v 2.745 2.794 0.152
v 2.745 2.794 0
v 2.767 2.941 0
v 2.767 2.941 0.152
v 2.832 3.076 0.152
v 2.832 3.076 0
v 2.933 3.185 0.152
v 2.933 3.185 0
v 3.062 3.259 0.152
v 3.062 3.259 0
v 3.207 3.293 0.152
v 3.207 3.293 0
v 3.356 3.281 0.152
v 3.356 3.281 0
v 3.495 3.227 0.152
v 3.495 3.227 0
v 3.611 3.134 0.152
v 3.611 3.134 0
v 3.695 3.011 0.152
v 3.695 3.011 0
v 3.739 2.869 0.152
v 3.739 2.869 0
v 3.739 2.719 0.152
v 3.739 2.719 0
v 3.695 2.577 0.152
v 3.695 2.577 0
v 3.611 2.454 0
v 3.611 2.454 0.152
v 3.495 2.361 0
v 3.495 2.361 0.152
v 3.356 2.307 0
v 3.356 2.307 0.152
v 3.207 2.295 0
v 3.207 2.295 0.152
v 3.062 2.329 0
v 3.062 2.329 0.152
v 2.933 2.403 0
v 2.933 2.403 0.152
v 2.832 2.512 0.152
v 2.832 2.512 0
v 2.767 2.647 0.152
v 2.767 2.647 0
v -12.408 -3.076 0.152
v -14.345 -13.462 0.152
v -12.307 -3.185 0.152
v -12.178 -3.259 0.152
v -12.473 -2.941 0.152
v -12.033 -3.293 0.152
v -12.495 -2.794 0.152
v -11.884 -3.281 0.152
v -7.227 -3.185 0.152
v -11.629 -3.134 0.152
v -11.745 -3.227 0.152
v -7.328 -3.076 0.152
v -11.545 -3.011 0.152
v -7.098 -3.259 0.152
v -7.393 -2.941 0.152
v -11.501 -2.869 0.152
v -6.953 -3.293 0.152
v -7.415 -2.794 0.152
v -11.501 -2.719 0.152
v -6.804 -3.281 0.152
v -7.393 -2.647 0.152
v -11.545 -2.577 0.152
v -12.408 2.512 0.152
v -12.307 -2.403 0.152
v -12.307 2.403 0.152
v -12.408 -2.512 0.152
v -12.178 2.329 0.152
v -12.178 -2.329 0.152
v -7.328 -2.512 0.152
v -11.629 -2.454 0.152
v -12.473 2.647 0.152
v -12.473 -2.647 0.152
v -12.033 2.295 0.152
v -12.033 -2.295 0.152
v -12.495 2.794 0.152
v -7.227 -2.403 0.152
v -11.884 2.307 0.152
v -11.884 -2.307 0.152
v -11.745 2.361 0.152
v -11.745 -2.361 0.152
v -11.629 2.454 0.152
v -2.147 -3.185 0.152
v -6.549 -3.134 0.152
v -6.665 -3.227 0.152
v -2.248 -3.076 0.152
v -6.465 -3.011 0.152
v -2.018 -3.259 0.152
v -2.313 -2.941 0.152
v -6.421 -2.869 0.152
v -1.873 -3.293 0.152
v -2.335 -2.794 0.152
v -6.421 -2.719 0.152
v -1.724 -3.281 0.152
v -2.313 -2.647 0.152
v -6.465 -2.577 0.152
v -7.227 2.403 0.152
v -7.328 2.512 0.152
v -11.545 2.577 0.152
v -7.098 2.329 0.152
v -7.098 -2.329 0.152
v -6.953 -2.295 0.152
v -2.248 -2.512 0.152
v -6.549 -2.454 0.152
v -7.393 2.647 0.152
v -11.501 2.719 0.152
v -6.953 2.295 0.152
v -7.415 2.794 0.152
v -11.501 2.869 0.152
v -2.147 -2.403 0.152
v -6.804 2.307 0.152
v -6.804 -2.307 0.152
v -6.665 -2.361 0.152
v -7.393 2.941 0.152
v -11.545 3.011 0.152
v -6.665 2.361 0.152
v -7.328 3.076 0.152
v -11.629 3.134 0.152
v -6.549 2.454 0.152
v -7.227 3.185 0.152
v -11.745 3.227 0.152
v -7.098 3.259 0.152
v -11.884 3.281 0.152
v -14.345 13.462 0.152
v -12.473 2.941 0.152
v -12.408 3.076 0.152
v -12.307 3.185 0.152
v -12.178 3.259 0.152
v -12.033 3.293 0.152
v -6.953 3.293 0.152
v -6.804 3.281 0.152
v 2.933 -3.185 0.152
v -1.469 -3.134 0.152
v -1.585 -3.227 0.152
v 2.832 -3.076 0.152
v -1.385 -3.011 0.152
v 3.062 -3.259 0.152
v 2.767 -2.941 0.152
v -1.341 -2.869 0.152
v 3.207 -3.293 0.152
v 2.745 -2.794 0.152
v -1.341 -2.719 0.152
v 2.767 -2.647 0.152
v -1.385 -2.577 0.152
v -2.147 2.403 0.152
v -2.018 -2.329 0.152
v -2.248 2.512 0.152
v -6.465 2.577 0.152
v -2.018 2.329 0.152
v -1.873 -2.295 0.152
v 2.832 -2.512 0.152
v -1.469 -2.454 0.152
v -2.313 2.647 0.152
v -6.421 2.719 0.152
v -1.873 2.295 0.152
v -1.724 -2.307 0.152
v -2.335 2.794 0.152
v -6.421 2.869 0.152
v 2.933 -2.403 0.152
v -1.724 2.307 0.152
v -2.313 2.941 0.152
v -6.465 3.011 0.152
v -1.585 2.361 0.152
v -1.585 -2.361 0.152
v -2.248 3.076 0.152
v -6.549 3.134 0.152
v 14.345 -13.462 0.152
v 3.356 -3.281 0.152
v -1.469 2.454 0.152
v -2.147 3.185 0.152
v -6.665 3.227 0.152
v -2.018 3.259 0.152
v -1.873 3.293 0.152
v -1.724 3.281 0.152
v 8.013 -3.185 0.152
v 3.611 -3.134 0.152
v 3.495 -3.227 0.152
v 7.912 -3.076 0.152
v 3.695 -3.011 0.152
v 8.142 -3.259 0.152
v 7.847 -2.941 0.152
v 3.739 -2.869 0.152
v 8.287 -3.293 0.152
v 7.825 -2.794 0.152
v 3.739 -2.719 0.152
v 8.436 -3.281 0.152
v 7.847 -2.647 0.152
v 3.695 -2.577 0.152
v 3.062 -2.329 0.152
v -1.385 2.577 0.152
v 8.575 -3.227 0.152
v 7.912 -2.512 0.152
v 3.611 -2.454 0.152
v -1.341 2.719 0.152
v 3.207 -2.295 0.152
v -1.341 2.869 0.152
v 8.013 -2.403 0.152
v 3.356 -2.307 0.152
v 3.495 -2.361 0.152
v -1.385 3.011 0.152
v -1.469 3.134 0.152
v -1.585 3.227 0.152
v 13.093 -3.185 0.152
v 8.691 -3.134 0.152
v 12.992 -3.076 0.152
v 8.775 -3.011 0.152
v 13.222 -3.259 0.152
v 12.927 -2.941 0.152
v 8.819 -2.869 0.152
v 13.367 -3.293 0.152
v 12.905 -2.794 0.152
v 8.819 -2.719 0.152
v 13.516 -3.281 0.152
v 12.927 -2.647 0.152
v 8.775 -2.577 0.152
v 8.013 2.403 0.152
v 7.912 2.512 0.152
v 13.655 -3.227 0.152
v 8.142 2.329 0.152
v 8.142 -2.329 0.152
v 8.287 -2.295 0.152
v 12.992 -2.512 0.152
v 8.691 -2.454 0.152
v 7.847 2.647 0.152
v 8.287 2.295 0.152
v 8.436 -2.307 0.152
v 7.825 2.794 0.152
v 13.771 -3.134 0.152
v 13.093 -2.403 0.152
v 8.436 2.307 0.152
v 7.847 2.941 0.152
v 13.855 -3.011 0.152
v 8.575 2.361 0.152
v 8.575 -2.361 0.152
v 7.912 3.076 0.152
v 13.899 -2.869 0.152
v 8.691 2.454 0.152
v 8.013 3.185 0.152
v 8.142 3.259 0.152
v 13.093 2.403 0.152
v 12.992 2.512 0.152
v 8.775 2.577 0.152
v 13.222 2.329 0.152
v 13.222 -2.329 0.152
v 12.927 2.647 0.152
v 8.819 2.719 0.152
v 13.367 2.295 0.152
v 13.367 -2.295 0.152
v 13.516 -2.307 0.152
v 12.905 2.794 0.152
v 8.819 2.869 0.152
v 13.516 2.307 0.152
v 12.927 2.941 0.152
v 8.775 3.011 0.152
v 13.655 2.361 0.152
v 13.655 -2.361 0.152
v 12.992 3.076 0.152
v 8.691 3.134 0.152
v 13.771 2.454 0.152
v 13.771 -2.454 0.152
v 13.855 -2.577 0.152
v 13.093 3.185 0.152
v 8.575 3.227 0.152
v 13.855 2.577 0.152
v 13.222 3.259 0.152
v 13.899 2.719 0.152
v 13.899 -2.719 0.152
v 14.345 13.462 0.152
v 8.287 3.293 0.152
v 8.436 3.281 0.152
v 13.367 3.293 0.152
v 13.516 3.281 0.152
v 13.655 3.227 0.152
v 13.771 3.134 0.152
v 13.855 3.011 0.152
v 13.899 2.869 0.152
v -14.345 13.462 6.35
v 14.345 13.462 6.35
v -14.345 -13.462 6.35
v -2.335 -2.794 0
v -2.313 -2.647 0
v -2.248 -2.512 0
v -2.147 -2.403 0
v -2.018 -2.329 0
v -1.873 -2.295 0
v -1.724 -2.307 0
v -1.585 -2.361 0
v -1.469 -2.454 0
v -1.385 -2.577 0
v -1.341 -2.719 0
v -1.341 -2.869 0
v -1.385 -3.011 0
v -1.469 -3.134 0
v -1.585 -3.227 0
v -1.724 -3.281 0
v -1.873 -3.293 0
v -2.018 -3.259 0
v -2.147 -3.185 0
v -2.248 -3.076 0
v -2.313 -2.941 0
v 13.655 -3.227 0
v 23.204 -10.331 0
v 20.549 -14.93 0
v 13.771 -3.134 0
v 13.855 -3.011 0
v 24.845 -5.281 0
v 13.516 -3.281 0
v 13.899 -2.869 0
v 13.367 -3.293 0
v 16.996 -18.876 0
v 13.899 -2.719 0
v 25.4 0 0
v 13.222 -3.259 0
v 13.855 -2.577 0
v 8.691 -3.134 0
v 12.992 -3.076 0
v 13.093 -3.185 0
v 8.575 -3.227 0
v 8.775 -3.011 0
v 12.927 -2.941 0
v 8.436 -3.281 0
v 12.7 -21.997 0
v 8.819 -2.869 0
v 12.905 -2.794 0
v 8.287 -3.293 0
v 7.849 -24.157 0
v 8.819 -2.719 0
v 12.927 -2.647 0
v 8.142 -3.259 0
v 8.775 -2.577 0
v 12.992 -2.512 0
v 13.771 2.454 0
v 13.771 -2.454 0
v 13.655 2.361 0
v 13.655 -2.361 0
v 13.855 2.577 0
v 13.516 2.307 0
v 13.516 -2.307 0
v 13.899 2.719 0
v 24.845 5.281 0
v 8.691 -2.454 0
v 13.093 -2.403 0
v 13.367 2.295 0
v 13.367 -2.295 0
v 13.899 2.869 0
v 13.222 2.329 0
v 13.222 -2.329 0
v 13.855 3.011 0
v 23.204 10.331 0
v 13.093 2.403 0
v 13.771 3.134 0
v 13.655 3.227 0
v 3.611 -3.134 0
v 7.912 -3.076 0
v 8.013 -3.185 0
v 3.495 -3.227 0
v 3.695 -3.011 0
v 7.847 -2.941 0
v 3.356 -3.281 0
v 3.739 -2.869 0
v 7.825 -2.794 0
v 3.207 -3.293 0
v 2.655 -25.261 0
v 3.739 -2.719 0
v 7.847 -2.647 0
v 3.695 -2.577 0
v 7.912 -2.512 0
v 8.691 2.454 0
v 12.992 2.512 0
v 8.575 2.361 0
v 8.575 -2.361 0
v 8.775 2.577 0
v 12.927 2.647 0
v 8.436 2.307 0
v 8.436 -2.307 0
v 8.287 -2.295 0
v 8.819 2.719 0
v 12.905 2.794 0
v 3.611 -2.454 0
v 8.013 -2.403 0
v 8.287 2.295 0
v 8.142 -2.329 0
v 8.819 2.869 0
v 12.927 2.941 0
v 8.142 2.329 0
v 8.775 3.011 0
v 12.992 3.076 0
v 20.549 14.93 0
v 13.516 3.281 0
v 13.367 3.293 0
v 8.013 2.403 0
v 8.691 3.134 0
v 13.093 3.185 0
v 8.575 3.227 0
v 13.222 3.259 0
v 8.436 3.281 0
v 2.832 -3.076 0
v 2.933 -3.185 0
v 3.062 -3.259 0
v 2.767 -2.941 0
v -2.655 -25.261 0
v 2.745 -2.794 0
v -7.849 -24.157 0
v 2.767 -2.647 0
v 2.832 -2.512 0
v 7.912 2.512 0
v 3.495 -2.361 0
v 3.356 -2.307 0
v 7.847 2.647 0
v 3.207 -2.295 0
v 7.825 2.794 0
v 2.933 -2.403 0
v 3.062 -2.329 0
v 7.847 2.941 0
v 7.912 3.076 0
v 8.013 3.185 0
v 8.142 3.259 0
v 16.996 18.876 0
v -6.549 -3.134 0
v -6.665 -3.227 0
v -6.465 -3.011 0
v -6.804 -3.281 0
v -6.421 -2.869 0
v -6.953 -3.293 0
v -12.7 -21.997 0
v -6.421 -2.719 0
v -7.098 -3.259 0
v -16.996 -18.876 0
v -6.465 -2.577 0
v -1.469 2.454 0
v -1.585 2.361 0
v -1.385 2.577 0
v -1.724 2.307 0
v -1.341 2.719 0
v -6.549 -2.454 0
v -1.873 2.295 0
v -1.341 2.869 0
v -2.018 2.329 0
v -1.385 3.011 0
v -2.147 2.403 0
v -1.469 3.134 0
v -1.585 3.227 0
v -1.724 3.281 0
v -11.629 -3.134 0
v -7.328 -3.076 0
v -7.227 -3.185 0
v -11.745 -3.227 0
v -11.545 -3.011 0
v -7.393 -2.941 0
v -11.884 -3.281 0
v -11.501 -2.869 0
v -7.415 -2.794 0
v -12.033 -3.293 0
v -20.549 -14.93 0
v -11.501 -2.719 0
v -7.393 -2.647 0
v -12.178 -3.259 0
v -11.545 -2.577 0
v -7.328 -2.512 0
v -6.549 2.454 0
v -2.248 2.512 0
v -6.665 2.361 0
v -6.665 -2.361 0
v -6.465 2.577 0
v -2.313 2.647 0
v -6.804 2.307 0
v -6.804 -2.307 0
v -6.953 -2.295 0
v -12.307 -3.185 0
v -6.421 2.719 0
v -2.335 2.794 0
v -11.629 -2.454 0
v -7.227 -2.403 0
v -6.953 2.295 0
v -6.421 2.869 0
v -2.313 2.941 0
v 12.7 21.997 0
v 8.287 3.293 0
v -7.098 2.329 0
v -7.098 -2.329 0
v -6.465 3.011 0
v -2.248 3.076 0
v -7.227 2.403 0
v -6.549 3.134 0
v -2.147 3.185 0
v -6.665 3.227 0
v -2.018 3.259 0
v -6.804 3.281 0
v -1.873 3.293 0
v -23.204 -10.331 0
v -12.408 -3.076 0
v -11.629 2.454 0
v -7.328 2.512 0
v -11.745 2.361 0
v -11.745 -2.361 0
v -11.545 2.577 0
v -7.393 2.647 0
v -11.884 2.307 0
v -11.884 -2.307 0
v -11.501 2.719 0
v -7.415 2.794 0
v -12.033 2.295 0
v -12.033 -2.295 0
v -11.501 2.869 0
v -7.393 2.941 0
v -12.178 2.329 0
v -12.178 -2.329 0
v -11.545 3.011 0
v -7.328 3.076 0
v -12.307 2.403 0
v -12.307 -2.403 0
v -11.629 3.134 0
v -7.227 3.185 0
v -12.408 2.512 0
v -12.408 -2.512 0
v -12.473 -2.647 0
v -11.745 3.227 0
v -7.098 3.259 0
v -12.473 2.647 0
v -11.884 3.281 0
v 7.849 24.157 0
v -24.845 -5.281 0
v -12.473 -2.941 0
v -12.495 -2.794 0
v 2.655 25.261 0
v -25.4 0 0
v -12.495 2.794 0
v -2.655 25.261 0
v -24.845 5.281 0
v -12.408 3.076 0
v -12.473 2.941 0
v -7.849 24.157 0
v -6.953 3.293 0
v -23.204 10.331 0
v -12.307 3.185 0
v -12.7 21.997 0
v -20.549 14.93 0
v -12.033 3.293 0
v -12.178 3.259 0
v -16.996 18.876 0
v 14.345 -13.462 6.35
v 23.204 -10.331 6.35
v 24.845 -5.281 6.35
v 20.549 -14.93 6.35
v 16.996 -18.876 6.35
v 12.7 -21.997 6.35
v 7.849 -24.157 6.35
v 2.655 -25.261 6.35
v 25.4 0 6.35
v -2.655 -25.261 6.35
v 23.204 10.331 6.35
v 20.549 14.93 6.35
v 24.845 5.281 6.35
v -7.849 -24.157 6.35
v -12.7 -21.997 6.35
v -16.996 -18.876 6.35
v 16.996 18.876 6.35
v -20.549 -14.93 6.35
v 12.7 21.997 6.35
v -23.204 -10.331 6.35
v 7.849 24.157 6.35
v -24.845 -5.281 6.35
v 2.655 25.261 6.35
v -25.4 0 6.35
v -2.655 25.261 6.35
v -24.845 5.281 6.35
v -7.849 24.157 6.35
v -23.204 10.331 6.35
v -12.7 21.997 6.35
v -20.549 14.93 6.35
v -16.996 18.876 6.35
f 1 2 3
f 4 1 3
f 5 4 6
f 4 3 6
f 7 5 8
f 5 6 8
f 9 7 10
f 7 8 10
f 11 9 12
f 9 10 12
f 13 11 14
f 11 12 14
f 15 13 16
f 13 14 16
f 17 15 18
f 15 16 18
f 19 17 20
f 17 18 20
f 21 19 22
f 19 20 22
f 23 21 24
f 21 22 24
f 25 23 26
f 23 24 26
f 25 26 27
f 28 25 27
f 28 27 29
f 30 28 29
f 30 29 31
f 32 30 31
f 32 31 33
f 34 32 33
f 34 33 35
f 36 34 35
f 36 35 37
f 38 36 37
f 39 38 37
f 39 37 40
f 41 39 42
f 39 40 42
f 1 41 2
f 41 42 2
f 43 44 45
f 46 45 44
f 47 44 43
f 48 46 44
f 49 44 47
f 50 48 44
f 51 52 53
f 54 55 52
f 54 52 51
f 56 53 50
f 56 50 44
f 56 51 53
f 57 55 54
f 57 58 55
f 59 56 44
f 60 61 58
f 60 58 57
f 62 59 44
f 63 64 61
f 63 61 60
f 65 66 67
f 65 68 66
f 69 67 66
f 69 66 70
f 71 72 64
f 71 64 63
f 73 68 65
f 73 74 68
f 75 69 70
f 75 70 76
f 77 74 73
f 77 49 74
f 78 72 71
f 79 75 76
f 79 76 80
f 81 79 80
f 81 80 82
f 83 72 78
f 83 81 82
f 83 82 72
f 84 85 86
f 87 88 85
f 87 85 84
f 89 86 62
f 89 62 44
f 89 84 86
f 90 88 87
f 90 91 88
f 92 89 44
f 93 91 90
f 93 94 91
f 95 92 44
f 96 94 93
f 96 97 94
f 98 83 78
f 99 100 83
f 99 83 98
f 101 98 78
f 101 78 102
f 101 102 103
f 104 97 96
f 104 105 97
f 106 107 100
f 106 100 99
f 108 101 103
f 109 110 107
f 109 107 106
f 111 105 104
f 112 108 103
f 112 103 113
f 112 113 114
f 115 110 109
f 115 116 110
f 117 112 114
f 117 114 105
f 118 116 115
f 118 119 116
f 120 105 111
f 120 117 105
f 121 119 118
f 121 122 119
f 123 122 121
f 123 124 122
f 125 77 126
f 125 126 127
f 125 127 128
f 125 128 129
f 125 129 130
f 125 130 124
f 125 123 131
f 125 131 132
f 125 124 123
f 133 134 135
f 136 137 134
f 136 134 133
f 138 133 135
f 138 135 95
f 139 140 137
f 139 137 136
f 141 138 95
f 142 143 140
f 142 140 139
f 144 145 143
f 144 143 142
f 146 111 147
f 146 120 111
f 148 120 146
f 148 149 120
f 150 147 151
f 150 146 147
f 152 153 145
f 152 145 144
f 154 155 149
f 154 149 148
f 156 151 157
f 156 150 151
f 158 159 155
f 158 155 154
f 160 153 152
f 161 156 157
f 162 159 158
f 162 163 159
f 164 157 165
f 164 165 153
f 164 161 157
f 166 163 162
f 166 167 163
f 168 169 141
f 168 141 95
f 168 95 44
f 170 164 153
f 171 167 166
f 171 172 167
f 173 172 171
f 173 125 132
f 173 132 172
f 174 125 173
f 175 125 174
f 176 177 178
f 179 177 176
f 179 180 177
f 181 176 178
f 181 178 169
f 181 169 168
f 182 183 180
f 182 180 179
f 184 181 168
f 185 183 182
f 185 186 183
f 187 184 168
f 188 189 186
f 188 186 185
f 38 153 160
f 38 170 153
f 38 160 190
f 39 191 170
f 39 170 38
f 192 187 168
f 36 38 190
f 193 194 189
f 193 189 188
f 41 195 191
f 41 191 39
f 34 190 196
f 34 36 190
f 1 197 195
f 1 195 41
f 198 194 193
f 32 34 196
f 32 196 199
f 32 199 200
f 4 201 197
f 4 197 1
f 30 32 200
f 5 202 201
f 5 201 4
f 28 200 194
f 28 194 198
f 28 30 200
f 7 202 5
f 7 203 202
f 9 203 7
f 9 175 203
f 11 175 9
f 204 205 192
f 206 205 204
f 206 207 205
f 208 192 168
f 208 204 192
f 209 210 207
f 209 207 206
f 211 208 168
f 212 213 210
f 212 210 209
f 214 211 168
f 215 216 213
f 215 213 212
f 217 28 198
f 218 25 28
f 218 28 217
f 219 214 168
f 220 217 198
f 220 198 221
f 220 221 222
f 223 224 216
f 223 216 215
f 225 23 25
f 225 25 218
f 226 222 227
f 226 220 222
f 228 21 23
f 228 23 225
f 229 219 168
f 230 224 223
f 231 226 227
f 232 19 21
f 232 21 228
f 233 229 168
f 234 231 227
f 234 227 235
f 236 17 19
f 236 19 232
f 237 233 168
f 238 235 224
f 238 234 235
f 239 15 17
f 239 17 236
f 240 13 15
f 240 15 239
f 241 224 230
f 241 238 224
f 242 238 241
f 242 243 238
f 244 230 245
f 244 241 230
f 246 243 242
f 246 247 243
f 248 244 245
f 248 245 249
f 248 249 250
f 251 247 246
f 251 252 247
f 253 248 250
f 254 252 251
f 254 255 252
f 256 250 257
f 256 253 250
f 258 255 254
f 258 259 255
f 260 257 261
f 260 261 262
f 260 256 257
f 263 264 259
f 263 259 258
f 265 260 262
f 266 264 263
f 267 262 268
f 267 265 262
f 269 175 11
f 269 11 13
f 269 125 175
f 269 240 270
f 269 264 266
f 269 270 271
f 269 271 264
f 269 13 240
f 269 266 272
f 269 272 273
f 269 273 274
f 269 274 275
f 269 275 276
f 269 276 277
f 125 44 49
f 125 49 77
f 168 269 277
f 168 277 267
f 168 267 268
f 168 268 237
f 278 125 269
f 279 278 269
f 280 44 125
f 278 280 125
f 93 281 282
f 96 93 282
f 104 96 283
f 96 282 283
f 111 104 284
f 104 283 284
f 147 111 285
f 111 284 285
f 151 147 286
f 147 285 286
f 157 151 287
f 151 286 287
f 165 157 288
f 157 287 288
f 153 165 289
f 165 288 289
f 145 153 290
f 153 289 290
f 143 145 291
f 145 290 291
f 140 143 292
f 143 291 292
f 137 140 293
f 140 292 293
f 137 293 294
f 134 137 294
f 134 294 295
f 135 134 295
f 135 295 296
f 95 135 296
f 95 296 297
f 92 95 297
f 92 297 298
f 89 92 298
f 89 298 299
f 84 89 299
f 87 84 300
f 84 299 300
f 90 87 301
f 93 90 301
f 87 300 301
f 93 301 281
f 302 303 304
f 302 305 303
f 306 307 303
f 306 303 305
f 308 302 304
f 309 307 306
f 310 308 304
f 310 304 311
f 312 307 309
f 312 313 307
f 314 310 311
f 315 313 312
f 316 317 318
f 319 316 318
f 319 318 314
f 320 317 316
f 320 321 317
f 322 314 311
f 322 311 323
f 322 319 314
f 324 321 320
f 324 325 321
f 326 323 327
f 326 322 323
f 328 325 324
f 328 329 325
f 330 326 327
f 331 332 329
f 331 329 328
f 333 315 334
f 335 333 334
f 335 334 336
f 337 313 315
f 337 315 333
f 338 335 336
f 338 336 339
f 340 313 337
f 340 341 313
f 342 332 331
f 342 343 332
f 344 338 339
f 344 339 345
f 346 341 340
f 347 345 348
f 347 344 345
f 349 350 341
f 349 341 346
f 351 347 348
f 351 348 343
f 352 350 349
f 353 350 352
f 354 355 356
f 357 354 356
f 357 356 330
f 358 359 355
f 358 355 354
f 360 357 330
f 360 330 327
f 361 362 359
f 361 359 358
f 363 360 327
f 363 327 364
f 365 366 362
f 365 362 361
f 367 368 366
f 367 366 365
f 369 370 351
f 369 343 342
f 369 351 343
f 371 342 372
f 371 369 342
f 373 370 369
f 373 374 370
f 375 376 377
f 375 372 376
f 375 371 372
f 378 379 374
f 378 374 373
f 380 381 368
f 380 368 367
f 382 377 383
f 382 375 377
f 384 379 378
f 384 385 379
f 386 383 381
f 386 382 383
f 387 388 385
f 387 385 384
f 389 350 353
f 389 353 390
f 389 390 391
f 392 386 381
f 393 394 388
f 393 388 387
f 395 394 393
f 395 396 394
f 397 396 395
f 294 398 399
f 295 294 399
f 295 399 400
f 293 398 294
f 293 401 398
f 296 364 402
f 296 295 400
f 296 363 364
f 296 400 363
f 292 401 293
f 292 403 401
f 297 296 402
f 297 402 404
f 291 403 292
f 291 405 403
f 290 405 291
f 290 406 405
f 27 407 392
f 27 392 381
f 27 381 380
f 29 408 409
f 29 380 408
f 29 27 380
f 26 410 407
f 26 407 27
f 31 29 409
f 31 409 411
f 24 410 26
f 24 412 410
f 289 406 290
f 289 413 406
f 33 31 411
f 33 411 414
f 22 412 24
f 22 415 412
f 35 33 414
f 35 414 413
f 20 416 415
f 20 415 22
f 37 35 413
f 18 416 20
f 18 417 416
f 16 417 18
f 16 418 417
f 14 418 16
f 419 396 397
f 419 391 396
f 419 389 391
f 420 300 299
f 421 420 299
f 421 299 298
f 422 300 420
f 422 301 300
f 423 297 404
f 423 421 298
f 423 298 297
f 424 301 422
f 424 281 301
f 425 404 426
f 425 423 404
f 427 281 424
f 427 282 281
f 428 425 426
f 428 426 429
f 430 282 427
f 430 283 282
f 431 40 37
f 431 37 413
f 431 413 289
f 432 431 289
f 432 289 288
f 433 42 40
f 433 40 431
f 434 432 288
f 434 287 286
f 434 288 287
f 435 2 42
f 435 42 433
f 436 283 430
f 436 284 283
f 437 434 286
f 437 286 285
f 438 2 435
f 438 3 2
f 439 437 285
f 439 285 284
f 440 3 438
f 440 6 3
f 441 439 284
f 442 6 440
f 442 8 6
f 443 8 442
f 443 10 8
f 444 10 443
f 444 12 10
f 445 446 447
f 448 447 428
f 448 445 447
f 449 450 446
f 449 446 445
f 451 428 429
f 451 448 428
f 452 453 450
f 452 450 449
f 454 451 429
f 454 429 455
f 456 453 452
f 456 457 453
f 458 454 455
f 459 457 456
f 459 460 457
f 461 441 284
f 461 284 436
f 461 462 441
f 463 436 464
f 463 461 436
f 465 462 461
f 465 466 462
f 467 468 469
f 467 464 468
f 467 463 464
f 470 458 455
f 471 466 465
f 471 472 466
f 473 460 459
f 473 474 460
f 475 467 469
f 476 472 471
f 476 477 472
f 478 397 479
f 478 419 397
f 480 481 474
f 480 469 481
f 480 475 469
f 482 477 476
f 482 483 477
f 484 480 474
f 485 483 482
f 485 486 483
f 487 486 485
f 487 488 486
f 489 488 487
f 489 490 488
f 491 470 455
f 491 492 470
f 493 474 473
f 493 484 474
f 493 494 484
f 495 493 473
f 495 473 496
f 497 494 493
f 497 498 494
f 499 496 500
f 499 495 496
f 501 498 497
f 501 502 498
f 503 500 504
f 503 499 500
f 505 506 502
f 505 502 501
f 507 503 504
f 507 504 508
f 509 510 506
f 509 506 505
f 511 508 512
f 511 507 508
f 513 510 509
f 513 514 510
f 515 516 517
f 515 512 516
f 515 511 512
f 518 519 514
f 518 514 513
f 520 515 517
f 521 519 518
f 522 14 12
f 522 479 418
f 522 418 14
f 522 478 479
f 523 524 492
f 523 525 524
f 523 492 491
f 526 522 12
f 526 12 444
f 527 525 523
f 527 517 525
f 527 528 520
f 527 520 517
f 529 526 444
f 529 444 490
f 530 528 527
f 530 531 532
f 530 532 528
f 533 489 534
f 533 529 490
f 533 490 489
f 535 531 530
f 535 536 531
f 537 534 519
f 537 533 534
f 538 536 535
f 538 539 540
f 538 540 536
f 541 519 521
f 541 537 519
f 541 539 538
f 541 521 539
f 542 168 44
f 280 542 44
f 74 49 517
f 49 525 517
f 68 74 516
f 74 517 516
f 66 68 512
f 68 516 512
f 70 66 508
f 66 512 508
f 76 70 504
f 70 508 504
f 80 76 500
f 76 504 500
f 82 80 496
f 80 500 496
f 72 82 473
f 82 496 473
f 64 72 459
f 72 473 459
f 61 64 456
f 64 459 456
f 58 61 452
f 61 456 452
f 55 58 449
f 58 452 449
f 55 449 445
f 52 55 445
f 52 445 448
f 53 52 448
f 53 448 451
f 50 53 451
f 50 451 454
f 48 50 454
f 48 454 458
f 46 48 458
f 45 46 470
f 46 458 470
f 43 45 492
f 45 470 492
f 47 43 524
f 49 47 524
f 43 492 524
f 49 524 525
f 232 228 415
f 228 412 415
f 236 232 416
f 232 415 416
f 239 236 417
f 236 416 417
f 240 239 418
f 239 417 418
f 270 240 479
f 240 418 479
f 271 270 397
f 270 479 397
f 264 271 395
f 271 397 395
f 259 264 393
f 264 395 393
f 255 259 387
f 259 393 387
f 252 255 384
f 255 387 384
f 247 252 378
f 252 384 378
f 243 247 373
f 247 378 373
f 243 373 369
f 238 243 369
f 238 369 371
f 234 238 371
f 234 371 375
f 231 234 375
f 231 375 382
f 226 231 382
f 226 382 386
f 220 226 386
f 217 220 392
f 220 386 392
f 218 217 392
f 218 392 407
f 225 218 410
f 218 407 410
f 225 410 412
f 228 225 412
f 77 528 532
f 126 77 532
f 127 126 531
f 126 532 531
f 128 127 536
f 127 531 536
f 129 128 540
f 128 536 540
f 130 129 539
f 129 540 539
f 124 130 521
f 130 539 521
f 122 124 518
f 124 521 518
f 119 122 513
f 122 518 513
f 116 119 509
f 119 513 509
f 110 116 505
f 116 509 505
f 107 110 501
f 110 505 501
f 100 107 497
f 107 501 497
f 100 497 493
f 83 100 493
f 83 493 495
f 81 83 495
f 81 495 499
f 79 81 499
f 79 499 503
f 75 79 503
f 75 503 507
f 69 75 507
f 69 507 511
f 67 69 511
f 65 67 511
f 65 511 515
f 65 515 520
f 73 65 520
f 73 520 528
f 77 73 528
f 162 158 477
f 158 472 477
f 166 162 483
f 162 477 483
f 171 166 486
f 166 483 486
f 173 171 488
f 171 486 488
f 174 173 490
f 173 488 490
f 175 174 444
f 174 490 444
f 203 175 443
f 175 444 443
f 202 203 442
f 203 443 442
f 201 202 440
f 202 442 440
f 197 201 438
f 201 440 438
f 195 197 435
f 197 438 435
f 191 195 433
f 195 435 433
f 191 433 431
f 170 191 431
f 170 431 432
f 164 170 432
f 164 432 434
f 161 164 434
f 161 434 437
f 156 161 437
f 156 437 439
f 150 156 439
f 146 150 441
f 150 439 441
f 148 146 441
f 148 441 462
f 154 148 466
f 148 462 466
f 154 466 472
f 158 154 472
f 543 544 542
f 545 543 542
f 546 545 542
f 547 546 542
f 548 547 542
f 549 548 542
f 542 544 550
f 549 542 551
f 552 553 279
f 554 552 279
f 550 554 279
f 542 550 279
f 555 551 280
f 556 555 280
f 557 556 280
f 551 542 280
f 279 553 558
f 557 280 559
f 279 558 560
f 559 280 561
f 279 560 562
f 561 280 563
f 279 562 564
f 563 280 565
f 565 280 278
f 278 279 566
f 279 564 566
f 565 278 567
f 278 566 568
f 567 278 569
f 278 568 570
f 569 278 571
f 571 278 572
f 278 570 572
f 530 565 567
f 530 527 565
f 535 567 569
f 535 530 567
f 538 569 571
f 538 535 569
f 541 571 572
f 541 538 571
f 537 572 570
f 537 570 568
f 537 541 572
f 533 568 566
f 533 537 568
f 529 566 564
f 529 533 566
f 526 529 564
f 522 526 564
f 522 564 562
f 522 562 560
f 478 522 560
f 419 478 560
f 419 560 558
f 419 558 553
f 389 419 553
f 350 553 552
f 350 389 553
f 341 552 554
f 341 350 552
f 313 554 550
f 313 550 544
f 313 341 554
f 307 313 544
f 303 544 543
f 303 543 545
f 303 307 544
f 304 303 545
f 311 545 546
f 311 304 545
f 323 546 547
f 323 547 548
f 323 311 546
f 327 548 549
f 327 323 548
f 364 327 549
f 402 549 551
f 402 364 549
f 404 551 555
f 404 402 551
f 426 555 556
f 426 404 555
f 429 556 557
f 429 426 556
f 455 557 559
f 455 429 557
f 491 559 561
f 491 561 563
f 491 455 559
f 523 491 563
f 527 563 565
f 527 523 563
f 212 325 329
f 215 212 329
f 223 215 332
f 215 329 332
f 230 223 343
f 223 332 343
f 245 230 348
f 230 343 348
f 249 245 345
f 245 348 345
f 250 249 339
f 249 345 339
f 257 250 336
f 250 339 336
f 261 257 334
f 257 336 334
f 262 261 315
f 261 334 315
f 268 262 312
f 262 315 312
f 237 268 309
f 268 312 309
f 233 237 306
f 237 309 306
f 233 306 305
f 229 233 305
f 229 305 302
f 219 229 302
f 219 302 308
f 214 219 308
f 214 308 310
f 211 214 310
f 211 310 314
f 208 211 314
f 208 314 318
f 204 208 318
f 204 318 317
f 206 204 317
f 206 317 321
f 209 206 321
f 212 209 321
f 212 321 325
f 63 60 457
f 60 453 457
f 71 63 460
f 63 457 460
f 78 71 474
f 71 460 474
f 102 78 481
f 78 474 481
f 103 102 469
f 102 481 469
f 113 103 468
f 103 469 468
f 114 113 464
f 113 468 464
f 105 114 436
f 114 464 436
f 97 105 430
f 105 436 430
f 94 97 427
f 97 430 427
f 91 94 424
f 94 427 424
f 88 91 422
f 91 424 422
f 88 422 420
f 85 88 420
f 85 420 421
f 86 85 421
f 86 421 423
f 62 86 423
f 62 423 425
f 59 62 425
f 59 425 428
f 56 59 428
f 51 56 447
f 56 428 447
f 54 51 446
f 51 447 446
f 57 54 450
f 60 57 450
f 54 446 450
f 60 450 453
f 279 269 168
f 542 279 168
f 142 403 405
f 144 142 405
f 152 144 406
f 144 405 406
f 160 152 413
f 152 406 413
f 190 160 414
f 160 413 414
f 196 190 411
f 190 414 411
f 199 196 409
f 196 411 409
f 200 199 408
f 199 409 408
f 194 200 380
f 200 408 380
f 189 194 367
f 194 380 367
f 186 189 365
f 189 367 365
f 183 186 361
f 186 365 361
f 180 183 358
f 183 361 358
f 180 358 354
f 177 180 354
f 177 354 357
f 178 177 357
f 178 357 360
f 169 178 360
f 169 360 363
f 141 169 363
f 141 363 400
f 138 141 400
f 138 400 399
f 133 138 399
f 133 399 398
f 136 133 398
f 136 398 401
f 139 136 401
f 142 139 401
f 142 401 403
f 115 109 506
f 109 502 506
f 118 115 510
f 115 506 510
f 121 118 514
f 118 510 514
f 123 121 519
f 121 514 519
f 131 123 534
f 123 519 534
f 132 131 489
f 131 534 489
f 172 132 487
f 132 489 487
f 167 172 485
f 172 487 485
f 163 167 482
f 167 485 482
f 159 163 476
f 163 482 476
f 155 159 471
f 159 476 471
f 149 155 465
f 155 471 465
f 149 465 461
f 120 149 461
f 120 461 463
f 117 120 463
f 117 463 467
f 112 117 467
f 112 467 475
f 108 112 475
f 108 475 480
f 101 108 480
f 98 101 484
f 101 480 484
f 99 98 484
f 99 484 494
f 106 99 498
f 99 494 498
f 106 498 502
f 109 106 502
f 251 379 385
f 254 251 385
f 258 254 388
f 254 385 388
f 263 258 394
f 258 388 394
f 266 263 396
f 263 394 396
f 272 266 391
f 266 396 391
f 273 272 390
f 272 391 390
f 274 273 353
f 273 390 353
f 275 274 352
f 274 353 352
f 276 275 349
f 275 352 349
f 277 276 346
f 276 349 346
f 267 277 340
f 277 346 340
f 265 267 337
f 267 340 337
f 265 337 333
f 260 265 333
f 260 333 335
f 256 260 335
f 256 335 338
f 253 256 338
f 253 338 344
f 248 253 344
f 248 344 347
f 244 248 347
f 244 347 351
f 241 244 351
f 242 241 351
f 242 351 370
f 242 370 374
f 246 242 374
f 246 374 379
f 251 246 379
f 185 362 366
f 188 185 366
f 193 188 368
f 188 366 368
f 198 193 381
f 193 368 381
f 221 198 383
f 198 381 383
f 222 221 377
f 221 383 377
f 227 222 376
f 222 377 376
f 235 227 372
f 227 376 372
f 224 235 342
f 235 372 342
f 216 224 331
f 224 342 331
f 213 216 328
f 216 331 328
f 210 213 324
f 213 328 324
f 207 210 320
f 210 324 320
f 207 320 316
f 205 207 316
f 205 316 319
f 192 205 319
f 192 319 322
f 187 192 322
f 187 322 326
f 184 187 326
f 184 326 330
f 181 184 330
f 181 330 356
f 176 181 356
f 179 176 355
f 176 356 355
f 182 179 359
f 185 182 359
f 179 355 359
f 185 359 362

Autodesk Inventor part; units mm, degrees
ref_plane "YZ Plane" through (0, 0, 0) normal (1, 0, 0) x (0, 1, 0)
ref_plane "XZ Plane" through (0, 0, 0) normal (0, 1, 0) x (-1, 0, 0)
ref_plane "XY Plane" through (0, 0, 0) normal (0, 0, 1) x (1, 0, 0)
sketch "Sketch1" plane through (0, 0, 0) normal (0, 0, 1) x (1, 0, 0)
  line L0 (-14.3446, 13.462) -> (14.3446, 13.462)
  line L1 (14.3446, 13.462) -> (14.3446, -13.462)
  line L2 (14.3446, -13.462) -> (-14.3446, -13.462)
  line L3 (-14.3446, -13.462) -> (-14.3446, 13.462)
  line L4 (-14.3446, 13.462) -> (14.3446, -13.462) construction
  line L5 (14.3446, 13.462) -> (-14.3446, -13.462) construction
  point P0 (0, 0)
  dimension "d0" = 28.6893
  dimension "d1" = 26.924
ref_plane "Work Plane1" through (0, 0, 0) normal (0, 0, -1) x (-1, 0, 0)
sketch "Sketch2" plane through (0, 0, 0) normal (0, 0, -1) x (-1, 0, 0)
  circle A0 centre (0, 0) radius 25.4
  dimension "d4" = 50.8
extrude "Extrusion2" add sketch "Sketch2" against normal blind 6.35
extrude "Extrusion3" cut sketch "Sketch1" along normal through all
sketch "Sketch3" plane through (0, 0, 0) normal (0, 0, 1) x (1, 0, 0)
  line L0 (-14.3446, -13.462) -> (14.3446, -13.462) projected
  line L1 (-14.3446, 13.462) -> (-14.3446, -13.462) projected
  line L2 (14.3446, 13.462) -> (-14.3446, 13.462) projected
  line L3 (14.3446, -13.462) -> (14.3446, 13.462) projected
  line L4 (-14.3446, 13.462) -> (-14.3446, -13.462) projected
  line L5 (-14.3446, -13.462) -> (14.3446, -13.462) projected
  line L6 (14.3446, -13.462) -> (14.3446, 13.462) projected
  line L7 (14.3446, 13.462) -> (-14.3446, 13.462) projected
  circle A0 centre (0, 0) radius 25.4 projected
  line L8 (-35.56, 0) -> (35.56, 0) projected
  line L9 (0, -35.56) -> (0, 35.56) projected
  line L10 (14.3446, 13.462) -> (-14.3446, 13.462) projected
  line L11 (-14.3446, -13.462) -> (14.3446, -13.462)
  line L12 (14.3446, -13.462) -> (14.3446, 13.462)
  line L13 (14.3446, 13.462) -> (-14.3446, 13.462)
  line L14 (-14.3446, 13.462) -> (-14.3446, -13.462)
  line L15 (-14.3446, -13.462) -> (14.3446, 13.462) construction
  line L16 (14.3446, -13.462) -> (-14.3446, 13.462) construction
  line L17 (14.3446, 13.462) -> (-14.3446, 13.462) projected
  line L18 (-14.3446, -13.462) -> (14.3447, -13.462)
  line L19 (14.3447, -13.462) -> (14.3446, 13.462)
  line L20 (14.3446, 13.462) -> (-14.3446, 13.462)
  line L21 (-14.3446, 13.462) -> (-14.3446, -13.462)
  line L22 (-14.3446, -13.462) -> (14.3446, 13.462) construction
  line L23 (14.3447, -13.462) -> (-14.3446, 13.462) construction
  line L24 (14.3446, -13.462) -> (14.3446, 13.462) projected
extrude "Extrusion4" add sketch "Sketch3" along normal blind 0.1524 contours L1 L8 L9 L0 | L9 L8 L3 L0 | L1 L2 L9 L8 | L9 L2 L3 L8
pattern_linear "Rectangular Pattern1" [suppressed]
sketch "Sketch4" plane through (0, 0, 0) normal (0, 0, 1) x (1, 0, 0)
  circle A0 centre (0, 0) radius 25.4 projected
  line L0 (-35.56, 0) -> (35.56, 0) projected
  line L1 (0, -35.56) -> (0, 35.56) projected
  line L2 (-14.3446, -13.462) -> (14.3446, -13.462) projected
  line L3 (13.5954, 13.462) -> (13.5954, -13.462) projected
  line L4 (-12.1856, -13.462) -> (13.5954, -13.462)
  line L5 (13.5954, -13.462) -> (13.5954, -0.254)
  line L6 (13.5954, -0.254) -> (-12.1857, -0.254)
  line L7 (-12.1857, -0.254) -> (-12.1856, -13.462)
  line L8 (13.2144, 13.462) -> (13.5954, 13.462)
  line L9 (10.6744, 13.462) -> (11.0554, 13.462)
  line L10 (8.1344, 13.462) -> (8.5154, 13.462)
  line L11 (5.5944, 13.462) -> (5.9754, 13.462)
  line L12 (3.0544, 13.462) -> (3.4354, 13.462)
  line L13 (0.5144, 13.462) -> (0.8954, 13.462)
  line L14 (-2.0256, 13.462) -> (-1.6446, 13.462)
  line L15 (-4.5656, 13.462) -> (-4.1846, 13.462)
  line L16 (-7.1056, 13.462) -> (-6.7246, 13.462)
  line L17 (-9.6456, 13.462) -> (-9.2646, 13.462)
  line L18 (-12.1856, 13.462) -> (-11.8046, 13.462)
  line L19 (-12.1856, 13.462) -> (-11.8046, 13.462)
  line L20 (-12.1856, 13.462) -> (13.5954, 13.462)
  line L21 (13.5954, 13.462) -> (13.5954, 0.254)
  line L22 (13.5954, 0.254) -> (-12.1857, 0.254)
  line L23 (-12.1857, 0.254) -> (-12.1856, 13.462)
  point P0 (-11.8046, -13.462)
  dimension "d15" = 0.254
extrude "Extrusion5" [suppressed]
sketch "Sketch5" plane through (0, 0, 0) normal (0, 0, -1) x (-1, 0, 0)
  circle A0 centre (0, 0) radius 25.4 projected
  line L0 (35.56, 0) -> (-35.56, 0) projected
  line L1 (0, -35.56) -> (0, 35.56) projected
  circle A1 centre (11.9952, -2.794) radius 0.5
  point P0 (11.9952, -0.254)
  dimension "d18" = 1
extrude "Extrusion6" cut sketch "Sketch5" against normal through all contours A1
pattern_linear "Rectangular Pattern2" count 6 spacing 5.08 along (1, 0, 0) of "Extrusion6"
mirror "Mirror1" about plane through (0, 0, 0) normal (0, 1, 0) of "Extrusion6", "Rectangular Pattern2"
sketch "Sketch6" plane through (0, 0, 0) normal (0, 0, -1) x (-1, 0, 0)
  point P0 (0, 0)
equation "\"BendRadius\" = Thickness"
equation "\"BendReliefWidth\" = Thickness"
equation "\"BendReliefDepth\" = 0.5 * Thickness"
equation "\"CornerReliefSize\" = 4 * Thickness"
equation "\"MinimumRemnant\" = 2 * Thickness"
equation "\"TransitionRadius\" = BendRadius"
equation "\"JacobiRadiusSize\" = BendRadius"
equation "\"GapSize\" = Thickness"
equation "\"Thickness\" = 3.048"
properties part number "_3DPrint"
